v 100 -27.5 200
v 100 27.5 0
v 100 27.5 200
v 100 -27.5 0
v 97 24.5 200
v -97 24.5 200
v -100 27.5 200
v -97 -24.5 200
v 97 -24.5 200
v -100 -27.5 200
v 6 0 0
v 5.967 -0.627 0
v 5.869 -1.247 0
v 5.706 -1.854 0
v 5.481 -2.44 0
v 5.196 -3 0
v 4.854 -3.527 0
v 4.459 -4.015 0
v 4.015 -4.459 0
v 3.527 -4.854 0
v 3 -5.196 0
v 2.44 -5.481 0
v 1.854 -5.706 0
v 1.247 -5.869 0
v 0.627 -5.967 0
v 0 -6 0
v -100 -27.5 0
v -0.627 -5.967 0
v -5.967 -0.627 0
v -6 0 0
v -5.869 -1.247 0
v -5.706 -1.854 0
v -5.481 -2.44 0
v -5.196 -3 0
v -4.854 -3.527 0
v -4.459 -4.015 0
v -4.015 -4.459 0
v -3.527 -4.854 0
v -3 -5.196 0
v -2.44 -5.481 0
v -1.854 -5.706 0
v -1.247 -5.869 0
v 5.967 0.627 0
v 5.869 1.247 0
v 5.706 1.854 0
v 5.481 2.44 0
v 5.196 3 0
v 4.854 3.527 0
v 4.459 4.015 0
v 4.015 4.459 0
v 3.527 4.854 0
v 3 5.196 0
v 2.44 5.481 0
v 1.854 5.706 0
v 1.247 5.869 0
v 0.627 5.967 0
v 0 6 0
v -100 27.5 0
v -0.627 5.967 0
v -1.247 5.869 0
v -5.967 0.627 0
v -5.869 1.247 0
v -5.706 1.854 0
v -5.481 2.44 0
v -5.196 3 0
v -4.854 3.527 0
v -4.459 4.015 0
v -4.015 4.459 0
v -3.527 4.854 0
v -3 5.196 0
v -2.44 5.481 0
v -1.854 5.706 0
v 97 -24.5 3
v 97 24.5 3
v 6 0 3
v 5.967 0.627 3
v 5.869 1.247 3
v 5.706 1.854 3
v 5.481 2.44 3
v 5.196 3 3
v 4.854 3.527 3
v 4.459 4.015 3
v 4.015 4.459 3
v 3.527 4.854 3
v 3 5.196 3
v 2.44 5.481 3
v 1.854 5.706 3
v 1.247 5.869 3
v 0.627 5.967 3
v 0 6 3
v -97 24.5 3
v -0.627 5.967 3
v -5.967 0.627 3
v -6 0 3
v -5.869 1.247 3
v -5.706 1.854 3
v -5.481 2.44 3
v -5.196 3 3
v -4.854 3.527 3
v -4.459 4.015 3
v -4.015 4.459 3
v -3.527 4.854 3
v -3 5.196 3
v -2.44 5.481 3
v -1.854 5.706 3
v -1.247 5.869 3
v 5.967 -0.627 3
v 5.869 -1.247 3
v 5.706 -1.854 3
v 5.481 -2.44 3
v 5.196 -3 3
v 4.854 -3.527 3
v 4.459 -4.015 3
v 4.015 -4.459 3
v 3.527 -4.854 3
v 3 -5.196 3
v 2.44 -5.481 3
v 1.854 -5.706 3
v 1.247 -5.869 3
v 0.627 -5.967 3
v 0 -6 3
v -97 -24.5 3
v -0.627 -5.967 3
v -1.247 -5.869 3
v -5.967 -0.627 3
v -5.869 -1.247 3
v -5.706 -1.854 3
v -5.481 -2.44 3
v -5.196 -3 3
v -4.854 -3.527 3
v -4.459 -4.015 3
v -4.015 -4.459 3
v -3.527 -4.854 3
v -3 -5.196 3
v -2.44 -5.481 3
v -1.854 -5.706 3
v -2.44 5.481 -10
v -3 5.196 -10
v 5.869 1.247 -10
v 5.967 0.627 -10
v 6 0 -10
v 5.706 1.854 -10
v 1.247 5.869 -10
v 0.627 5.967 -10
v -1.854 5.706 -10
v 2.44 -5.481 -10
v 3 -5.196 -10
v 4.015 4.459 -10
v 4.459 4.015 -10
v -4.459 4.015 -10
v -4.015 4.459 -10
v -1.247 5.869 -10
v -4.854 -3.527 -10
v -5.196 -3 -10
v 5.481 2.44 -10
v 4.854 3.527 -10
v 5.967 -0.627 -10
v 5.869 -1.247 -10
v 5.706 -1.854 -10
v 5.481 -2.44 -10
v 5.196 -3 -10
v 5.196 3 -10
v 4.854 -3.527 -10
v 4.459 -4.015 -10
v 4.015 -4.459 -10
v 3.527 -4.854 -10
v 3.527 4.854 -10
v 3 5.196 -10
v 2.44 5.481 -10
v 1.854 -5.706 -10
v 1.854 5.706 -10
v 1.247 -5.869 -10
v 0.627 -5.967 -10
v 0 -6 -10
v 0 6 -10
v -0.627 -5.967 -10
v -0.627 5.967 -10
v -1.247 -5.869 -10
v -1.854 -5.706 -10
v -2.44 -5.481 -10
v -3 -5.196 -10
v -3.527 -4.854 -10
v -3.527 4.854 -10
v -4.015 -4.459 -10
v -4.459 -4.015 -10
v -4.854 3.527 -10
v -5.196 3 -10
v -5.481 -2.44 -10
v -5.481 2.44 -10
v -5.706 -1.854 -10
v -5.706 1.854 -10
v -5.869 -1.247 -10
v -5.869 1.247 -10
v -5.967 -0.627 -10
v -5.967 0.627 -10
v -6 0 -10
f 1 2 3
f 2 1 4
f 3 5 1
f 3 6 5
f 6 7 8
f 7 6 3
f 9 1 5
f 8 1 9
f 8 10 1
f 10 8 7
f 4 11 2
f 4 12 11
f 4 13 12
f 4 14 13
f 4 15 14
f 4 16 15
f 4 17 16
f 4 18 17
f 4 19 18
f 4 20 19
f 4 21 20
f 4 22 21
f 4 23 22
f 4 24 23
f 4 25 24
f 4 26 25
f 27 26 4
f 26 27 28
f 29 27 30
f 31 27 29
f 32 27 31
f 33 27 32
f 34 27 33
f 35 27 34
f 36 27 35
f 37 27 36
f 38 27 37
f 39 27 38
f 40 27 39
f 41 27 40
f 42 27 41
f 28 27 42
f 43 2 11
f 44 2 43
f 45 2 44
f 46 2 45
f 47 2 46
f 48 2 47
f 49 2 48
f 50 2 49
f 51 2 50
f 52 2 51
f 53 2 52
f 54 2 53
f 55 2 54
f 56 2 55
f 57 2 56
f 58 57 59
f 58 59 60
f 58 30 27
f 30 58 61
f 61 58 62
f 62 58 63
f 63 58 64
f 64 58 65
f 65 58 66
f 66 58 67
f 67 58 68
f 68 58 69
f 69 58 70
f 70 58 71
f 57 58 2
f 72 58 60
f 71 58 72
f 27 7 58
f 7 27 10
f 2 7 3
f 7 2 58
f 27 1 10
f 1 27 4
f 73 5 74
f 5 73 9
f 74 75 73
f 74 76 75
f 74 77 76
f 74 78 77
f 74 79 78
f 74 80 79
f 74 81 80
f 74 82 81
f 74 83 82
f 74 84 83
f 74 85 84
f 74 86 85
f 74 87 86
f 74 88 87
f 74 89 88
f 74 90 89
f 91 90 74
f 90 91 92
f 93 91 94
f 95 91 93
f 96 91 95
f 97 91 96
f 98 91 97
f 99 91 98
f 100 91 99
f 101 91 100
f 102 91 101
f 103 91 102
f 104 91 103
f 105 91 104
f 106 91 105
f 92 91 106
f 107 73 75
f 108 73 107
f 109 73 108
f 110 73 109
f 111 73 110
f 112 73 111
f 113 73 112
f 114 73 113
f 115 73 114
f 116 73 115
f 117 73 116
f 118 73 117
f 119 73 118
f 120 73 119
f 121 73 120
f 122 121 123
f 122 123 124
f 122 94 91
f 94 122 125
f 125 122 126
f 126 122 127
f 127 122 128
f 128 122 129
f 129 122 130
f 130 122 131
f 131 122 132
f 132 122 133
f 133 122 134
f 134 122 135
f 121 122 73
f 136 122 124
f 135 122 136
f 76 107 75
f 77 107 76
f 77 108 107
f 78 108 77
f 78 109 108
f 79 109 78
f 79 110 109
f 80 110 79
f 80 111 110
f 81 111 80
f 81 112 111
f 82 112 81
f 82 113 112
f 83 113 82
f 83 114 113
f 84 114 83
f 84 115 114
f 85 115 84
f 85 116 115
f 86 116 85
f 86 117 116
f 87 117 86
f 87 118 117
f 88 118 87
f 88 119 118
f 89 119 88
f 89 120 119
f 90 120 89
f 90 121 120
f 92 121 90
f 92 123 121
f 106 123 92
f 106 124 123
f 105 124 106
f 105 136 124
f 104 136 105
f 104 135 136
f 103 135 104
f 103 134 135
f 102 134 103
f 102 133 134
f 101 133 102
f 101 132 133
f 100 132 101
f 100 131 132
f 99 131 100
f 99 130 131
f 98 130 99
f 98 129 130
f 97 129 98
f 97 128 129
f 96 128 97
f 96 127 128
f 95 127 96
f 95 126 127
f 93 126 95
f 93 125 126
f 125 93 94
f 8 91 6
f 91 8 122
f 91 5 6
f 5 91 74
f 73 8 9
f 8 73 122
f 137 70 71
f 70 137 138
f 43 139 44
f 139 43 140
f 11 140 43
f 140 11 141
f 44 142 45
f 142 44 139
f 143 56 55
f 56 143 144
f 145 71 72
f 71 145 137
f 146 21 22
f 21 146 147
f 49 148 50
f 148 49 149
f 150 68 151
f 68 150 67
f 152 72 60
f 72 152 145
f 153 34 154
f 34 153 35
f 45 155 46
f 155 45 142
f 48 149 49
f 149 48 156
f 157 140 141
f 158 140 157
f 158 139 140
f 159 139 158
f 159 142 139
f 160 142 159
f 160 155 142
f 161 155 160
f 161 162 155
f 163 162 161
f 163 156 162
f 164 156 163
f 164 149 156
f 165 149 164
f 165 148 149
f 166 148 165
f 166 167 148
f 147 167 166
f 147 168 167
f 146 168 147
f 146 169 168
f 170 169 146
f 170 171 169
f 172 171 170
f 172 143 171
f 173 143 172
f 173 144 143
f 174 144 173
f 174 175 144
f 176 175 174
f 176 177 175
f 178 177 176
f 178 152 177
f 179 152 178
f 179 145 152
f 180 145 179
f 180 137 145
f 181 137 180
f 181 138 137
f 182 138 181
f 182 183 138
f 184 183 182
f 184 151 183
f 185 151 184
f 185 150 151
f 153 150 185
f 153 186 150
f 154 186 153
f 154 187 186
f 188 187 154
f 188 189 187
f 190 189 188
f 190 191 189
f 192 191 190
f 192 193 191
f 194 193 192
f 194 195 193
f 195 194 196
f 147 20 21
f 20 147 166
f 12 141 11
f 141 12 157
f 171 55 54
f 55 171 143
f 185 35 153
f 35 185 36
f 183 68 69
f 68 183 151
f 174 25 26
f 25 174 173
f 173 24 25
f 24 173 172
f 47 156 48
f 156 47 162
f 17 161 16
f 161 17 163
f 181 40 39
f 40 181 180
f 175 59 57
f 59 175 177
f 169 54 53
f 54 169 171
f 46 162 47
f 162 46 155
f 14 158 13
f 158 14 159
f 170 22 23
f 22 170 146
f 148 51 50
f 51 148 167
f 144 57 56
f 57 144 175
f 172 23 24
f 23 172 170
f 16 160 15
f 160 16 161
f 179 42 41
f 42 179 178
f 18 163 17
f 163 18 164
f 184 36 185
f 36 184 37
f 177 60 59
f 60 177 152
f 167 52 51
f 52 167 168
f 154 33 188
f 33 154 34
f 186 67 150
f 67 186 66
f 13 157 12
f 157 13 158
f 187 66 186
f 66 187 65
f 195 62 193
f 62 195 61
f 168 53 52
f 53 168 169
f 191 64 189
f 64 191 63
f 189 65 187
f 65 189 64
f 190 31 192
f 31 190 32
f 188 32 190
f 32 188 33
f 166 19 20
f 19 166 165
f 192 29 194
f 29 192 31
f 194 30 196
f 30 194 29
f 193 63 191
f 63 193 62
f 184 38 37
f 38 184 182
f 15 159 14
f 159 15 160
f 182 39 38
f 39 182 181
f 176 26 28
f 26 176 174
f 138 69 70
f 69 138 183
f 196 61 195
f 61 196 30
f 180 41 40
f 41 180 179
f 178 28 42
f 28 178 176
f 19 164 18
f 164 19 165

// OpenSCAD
// file: design_params.scad
/*
 * fika - shared design parameters, the single source of truth.
 *
 * Read by every cad/*.scad (include <design_params.scad>) and re-parsed by
 * scripts/design_params.py for scripts/check_layout.py and
 * tools/energy_budget.py, so a value changed here flips the whole pipeline
 * at once. scripts/check_params.py fails the build if any other .scad
 * shadows a name defined here.
 *
 * Keep every line a plain literal: name = value; (numbers, booleans, flat
 * vectors). No arithmetic - derived values are computed by the consumers.
 *
 * Units: mm, deg C, W, V, A, bar, g unless noted.
 * Coordinates: origin at the center of the base plate top surface.
 * X right, Y toward the back, Z up. Positions are component reference
 * points noted per name.
 */

// frame envelope (outer dimensions, CNC aluminum plates)
frame_w = 310;
frame_d = 320;
frame_h = 400;          // side plate height; sides run z -8..392
frame_plate_t = 8;      // structural plates: sides, base, rear, top
mount_plate_t = 6;      // group mount plate
mount_plate_d = 90;     // group mount plate depth (y extent)
mount_plate_y = 20;     // group mount plate front edge

// boiler (single, dual use, copper shell; position = bottom center)
boiler_od = 102;
boiler_h = 160;
boiler_wall = 2;
boiler_x = -50;
boiler_y = 180;
boiler_z = 150;
boiler_volume_l = 1.0;  // nominal fill, used by the energy budget

// heater and mains
heater_power_w = 1400;
mains_voltage = 230;
mains_breaker_a = 10;
brew_temp_c = 93;
steam_temp_c = 125;
max_temp_c = 135;       // firmware hard cutoff; mechanical cutoff above this

// pump: rotary vane head + mains motor, axis along X at the rear base
// (position = axis center; assembly centered on pump_x)
pump_head_d = 42;
pump_head_l = 105;
motor_d = 100;
motor_l = 160;
pump_x = 0;
pump_y = 255;
pump_z = 55;
opv_bar = 9;            // pump bypass back to reservoir
relief_bar = 12;        // boiler mechanical safety relief valve

// brew group and cup zone (position = group axis at tray center)
group_od = 70;
group_h = 90;
group_x = 0;
group_y = 65;
cup_clearance_h = 95;   // spout height above the tray top
cup_max_d = 90;

// drip tray with load cell scale (tray_z = top of load cell + gap)
tray_w = 200;
tray_d = 130;
tray_h = 30;
tray_y = 15;            // tray front edge
tray_z = 13;
loadcell_l = 55;        // TAL220-class bar load cell
loadcell_w = 12.7;
loadcell_h = 12.7;
scale_capacity_g = 1000;

// water tank (position = front face / bottom)
tank_w = 200;
tank_d = 55;
tank_h = 200;
tank_y = 245;
tank_z = 150;

// plumbing, copper lines (suction from the tank is larger bore)
brew_line_od = 6;
brew_line_wall = 1;
steam_line_od = 6;
suction_line_od = 8;

// fasteners (one bolt size for every frame joint, M5 with clearance)
bolt_hole_d = 5.3;

// layout rules (scripts/check_layout.py)
clearance = 10;         // minimum gap between component envelopes
clearance_wall = 5;     // minimum gap between components and frame plates
// main file
/*
 * fika - water tank envelope.
 * Purpose: layout placeholder for the reservoir at the rear, feeding the
 *          pump by gravity. Origin at the bottom center of the footprint.
 *          Stub marks the bottom outlet to the suction line.
 * Material: glass or stainless container (off the shelf)
 * Fabrication: cots
 */

include <design_params.scad>

$fn = 60;

module tank() {
    color("#8899aa") {
        difference() {
            translate([-tank_w / 2, -tank_d / 2, 0])
                cube([tank_w, tank_d, tank_h]);
            translate([-tank_w / 2 + 3, -tank_d / 2 + 3, 3])
                cube([tank_w - 6, tank_d - 6, tank_h]);
        }
        // bottom outlet to the pump suction line
        translate([0, 0, -10]) cylinder(d = 12, h = 13);
    }
}

tank();
